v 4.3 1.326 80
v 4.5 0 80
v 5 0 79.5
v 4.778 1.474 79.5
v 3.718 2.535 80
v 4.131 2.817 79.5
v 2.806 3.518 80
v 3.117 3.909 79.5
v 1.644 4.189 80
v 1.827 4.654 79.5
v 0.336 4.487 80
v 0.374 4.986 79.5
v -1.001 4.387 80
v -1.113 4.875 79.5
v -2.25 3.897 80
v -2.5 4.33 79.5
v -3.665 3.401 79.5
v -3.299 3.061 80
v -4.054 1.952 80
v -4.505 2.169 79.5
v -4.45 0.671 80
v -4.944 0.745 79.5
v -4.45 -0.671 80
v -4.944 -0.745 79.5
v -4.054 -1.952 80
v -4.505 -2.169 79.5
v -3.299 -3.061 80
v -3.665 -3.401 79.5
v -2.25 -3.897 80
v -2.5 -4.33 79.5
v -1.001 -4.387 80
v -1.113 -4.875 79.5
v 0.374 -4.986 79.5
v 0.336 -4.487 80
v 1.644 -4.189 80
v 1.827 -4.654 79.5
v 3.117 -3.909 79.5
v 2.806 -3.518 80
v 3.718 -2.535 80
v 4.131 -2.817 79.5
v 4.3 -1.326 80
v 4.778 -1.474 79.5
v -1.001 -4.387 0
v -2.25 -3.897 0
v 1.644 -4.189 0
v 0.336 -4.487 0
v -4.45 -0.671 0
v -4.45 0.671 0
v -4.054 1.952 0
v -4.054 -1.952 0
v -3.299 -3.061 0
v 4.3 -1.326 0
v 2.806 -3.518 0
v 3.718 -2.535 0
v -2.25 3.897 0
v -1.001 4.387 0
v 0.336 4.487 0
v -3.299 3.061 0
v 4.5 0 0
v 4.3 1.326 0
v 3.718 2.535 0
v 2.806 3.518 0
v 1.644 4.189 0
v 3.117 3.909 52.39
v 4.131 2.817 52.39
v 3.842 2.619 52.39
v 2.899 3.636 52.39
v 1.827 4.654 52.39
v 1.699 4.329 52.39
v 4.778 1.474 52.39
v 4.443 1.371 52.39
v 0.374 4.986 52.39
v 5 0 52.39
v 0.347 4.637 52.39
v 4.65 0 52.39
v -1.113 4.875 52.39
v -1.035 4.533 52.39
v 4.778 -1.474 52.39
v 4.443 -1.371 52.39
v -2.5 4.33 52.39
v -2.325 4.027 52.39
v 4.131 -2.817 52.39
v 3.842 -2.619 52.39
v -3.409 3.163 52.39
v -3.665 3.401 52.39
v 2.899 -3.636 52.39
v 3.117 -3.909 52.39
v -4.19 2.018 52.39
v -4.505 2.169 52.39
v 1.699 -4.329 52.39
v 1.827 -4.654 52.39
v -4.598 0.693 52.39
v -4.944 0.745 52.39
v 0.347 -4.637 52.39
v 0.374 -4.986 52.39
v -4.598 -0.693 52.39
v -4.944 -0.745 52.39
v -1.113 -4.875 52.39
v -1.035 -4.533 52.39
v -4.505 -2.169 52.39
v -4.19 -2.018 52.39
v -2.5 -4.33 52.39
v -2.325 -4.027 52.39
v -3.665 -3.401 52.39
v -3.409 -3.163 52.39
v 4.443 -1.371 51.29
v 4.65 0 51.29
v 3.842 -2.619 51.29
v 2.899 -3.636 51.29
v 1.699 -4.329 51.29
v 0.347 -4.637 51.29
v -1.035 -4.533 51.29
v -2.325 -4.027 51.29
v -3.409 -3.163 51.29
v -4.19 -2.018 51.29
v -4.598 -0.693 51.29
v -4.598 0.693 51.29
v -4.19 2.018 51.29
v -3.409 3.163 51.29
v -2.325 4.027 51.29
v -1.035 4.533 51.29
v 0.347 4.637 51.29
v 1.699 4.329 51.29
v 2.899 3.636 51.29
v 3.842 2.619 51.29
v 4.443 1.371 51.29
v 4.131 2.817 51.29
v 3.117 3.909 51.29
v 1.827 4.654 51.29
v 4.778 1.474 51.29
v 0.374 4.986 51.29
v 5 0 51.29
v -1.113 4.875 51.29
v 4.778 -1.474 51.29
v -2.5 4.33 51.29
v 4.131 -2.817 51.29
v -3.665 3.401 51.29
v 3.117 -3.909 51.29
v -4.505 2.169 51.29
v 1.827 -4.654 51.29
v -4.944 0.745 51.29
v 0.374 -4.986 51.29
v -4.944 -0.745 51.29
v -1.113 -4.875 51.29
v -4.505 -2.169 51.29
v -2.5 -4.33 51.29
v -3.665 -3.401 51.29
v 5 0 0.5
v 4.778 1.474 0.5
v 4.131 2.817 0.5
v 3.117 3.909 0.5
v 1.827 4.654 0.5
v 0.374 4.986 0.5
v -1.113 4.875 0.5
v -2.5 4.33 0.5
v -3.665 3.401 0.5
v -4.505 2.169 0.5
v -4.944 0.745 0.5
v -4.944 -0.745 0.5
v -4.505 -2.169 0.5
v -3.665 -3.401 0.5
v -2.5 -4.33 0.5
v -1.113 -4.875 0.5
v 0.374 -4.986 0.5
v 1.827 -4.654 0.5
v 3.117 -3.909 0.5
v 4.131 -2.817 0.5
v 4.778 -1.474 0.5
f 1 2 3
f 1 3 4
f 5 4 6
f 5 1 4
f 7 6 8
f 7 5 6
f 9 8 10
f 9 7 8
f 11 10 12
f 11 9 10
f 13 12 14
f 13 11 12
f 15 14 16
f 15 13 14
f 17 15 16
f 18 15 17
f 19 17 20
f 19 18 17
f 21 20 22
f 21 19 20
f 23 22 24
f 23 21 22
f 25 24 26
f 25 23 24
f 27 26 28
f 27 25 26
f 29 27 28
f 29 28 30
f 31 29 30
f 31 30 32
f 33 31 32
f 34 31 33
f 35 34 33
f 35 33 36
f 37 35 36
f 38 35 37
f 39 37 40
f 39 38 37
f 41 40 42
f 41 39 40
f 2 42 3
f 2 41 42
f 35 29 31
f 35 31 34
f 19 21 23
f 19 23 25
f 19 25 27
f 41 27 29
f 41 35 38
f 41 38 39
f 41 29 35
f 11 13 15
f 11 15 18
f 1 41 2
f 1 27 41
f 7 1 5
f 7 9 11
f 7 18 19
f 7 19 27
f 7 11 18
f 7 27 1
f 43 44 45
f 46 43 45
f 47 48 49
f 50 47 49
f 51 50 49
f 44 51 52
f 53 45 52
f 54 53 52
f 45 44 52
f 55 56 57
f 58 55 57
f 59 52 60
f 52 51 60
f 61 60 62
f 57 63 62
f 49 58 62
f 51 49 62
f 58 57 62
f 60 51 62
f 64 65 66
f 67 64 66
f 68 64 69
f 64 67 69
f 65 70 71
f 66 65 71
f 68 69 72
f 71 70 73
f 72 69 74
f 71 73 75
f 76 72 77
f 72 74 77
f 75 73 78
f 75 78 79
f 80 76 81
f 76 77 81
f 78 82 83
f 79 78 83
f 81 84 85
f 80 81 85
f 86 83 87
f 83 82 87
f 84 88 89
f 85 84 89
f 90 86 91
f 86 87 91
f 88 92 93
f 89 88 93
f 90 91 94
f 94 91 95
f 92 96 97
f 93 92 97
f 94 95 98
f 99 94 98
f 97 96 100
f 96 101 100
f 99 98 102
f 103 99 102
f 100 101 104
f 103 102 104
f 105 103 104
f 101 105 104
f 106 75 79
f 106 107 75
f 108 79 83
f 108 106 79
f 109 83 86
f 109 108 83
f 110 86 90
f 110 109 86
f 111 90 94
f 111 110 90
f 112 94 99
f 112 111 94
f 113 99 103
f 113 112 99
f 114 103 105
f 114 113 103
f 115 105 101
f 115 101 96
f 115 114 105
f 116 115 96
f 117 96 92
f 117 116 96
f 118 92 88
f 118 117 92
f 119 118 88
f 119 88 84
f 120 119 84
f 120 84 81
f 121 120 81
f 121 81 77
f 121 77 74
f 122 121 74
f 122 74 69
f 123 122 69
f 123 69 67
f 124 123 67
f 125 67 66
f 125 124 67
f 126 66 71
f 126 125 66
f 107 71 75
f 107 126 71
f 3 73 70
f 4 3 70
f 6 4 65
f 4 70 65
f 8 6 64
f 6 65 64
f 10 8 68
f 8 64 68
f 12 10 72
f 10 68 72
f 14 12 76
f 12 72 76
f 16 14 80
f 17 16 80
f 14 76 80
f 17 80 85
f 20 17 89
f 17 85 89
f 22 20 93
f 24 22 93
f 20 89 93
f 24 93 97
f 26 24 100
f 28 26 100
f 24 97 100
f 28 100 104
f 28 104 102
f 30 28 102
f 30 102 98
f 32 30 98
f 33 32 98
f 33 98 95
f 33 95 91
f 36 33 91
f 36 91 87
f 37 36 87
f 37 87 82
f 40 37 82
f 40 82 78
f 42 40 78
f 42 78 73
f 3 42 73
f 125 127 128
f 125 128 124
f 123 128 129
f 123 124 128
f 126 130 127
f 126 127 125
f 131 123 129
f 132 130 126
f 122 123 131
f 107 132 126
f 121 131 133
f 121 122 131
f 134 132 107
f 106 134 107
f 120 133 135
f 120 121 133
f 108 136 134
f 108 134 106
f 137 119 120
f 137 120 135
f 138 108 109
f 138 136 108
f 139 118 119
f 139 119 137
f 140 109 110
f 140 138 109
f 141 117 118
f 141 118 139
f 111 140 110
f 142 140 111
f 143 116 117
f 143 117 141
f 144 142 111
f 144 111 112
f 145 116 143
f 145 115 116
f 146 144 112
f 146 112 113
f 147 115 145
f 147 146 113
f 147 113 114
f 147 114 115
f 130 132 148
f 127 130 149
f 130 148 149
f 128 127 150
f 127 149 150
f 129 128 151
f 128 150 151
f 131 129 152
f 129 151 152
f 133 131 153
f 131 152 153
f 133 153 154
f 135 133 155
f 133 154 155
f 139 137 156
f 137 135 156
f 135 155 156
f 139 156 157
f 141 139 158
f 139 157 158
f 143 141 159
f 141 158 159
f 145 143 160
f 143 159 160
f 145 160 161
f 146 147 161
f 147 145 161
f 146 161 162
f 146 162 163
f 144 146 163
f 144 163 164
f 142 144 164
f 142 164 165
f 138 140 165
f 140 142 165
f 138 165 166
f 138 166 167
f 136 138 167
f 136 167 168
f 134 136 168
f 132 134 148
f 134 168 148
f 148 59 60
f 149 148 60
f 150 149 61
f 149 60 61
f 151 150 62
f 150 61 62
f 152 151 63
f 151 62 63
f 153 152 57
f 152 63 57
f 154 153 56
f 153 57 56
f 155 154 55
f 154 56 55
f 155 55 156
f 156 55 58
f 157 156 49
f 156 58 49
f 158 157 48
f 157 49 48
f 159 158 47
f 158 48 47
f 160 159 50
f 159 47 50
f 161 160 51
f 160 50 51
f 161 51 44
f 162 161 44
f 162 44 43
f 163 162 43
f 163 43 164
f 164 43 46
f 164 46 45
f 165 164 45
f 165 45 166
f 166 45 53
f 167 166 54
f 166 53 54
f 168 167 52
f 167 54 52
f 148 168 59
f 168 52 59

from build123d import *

# Parameters (mm, degrees)
SKETCH_1_R      = 5
EXTRUDE_1_DEPTH = 80
CHAMFER_1_SIZE  = 0.5
SKETCH_2_W      = 2.220028262
SKETCH_2_H      = 1.1


with BuildPart() as part:
    # 草图1 → 拉伸1 (new body)
    with BuildSketch(Plane.XY):
        Circle(SKETCH_1_R)
    extrude(amount=EXTRUDE_1_DEPTH)

    # 倒角1
    chamfer_1_edges = [part.edges().sort_by_distance(p)[0] for p in [
        (-5, 0, 0),
        (-5, 0, 80),
    ]]
    chamfer(chamfer_1_edges, length=CHAMFER_1_SIZE)

    # 草图2 → 切除-旋转1 (revolve, cut)
    with BuildSketch(Plane(origin=(0, 0, 0), x_dir=(1, 0, 0), z_dir=(0, 1, 0))):
        with Locations((5.760014131, -51.839999917)):
            Rectangle(SKETCH_2_W, SKETCH_2_H)
    revolve(axis=Axis((0, 0, 80), (0, 0, -1)), mode=Mode.SUBTRACT)


solid = part.part
